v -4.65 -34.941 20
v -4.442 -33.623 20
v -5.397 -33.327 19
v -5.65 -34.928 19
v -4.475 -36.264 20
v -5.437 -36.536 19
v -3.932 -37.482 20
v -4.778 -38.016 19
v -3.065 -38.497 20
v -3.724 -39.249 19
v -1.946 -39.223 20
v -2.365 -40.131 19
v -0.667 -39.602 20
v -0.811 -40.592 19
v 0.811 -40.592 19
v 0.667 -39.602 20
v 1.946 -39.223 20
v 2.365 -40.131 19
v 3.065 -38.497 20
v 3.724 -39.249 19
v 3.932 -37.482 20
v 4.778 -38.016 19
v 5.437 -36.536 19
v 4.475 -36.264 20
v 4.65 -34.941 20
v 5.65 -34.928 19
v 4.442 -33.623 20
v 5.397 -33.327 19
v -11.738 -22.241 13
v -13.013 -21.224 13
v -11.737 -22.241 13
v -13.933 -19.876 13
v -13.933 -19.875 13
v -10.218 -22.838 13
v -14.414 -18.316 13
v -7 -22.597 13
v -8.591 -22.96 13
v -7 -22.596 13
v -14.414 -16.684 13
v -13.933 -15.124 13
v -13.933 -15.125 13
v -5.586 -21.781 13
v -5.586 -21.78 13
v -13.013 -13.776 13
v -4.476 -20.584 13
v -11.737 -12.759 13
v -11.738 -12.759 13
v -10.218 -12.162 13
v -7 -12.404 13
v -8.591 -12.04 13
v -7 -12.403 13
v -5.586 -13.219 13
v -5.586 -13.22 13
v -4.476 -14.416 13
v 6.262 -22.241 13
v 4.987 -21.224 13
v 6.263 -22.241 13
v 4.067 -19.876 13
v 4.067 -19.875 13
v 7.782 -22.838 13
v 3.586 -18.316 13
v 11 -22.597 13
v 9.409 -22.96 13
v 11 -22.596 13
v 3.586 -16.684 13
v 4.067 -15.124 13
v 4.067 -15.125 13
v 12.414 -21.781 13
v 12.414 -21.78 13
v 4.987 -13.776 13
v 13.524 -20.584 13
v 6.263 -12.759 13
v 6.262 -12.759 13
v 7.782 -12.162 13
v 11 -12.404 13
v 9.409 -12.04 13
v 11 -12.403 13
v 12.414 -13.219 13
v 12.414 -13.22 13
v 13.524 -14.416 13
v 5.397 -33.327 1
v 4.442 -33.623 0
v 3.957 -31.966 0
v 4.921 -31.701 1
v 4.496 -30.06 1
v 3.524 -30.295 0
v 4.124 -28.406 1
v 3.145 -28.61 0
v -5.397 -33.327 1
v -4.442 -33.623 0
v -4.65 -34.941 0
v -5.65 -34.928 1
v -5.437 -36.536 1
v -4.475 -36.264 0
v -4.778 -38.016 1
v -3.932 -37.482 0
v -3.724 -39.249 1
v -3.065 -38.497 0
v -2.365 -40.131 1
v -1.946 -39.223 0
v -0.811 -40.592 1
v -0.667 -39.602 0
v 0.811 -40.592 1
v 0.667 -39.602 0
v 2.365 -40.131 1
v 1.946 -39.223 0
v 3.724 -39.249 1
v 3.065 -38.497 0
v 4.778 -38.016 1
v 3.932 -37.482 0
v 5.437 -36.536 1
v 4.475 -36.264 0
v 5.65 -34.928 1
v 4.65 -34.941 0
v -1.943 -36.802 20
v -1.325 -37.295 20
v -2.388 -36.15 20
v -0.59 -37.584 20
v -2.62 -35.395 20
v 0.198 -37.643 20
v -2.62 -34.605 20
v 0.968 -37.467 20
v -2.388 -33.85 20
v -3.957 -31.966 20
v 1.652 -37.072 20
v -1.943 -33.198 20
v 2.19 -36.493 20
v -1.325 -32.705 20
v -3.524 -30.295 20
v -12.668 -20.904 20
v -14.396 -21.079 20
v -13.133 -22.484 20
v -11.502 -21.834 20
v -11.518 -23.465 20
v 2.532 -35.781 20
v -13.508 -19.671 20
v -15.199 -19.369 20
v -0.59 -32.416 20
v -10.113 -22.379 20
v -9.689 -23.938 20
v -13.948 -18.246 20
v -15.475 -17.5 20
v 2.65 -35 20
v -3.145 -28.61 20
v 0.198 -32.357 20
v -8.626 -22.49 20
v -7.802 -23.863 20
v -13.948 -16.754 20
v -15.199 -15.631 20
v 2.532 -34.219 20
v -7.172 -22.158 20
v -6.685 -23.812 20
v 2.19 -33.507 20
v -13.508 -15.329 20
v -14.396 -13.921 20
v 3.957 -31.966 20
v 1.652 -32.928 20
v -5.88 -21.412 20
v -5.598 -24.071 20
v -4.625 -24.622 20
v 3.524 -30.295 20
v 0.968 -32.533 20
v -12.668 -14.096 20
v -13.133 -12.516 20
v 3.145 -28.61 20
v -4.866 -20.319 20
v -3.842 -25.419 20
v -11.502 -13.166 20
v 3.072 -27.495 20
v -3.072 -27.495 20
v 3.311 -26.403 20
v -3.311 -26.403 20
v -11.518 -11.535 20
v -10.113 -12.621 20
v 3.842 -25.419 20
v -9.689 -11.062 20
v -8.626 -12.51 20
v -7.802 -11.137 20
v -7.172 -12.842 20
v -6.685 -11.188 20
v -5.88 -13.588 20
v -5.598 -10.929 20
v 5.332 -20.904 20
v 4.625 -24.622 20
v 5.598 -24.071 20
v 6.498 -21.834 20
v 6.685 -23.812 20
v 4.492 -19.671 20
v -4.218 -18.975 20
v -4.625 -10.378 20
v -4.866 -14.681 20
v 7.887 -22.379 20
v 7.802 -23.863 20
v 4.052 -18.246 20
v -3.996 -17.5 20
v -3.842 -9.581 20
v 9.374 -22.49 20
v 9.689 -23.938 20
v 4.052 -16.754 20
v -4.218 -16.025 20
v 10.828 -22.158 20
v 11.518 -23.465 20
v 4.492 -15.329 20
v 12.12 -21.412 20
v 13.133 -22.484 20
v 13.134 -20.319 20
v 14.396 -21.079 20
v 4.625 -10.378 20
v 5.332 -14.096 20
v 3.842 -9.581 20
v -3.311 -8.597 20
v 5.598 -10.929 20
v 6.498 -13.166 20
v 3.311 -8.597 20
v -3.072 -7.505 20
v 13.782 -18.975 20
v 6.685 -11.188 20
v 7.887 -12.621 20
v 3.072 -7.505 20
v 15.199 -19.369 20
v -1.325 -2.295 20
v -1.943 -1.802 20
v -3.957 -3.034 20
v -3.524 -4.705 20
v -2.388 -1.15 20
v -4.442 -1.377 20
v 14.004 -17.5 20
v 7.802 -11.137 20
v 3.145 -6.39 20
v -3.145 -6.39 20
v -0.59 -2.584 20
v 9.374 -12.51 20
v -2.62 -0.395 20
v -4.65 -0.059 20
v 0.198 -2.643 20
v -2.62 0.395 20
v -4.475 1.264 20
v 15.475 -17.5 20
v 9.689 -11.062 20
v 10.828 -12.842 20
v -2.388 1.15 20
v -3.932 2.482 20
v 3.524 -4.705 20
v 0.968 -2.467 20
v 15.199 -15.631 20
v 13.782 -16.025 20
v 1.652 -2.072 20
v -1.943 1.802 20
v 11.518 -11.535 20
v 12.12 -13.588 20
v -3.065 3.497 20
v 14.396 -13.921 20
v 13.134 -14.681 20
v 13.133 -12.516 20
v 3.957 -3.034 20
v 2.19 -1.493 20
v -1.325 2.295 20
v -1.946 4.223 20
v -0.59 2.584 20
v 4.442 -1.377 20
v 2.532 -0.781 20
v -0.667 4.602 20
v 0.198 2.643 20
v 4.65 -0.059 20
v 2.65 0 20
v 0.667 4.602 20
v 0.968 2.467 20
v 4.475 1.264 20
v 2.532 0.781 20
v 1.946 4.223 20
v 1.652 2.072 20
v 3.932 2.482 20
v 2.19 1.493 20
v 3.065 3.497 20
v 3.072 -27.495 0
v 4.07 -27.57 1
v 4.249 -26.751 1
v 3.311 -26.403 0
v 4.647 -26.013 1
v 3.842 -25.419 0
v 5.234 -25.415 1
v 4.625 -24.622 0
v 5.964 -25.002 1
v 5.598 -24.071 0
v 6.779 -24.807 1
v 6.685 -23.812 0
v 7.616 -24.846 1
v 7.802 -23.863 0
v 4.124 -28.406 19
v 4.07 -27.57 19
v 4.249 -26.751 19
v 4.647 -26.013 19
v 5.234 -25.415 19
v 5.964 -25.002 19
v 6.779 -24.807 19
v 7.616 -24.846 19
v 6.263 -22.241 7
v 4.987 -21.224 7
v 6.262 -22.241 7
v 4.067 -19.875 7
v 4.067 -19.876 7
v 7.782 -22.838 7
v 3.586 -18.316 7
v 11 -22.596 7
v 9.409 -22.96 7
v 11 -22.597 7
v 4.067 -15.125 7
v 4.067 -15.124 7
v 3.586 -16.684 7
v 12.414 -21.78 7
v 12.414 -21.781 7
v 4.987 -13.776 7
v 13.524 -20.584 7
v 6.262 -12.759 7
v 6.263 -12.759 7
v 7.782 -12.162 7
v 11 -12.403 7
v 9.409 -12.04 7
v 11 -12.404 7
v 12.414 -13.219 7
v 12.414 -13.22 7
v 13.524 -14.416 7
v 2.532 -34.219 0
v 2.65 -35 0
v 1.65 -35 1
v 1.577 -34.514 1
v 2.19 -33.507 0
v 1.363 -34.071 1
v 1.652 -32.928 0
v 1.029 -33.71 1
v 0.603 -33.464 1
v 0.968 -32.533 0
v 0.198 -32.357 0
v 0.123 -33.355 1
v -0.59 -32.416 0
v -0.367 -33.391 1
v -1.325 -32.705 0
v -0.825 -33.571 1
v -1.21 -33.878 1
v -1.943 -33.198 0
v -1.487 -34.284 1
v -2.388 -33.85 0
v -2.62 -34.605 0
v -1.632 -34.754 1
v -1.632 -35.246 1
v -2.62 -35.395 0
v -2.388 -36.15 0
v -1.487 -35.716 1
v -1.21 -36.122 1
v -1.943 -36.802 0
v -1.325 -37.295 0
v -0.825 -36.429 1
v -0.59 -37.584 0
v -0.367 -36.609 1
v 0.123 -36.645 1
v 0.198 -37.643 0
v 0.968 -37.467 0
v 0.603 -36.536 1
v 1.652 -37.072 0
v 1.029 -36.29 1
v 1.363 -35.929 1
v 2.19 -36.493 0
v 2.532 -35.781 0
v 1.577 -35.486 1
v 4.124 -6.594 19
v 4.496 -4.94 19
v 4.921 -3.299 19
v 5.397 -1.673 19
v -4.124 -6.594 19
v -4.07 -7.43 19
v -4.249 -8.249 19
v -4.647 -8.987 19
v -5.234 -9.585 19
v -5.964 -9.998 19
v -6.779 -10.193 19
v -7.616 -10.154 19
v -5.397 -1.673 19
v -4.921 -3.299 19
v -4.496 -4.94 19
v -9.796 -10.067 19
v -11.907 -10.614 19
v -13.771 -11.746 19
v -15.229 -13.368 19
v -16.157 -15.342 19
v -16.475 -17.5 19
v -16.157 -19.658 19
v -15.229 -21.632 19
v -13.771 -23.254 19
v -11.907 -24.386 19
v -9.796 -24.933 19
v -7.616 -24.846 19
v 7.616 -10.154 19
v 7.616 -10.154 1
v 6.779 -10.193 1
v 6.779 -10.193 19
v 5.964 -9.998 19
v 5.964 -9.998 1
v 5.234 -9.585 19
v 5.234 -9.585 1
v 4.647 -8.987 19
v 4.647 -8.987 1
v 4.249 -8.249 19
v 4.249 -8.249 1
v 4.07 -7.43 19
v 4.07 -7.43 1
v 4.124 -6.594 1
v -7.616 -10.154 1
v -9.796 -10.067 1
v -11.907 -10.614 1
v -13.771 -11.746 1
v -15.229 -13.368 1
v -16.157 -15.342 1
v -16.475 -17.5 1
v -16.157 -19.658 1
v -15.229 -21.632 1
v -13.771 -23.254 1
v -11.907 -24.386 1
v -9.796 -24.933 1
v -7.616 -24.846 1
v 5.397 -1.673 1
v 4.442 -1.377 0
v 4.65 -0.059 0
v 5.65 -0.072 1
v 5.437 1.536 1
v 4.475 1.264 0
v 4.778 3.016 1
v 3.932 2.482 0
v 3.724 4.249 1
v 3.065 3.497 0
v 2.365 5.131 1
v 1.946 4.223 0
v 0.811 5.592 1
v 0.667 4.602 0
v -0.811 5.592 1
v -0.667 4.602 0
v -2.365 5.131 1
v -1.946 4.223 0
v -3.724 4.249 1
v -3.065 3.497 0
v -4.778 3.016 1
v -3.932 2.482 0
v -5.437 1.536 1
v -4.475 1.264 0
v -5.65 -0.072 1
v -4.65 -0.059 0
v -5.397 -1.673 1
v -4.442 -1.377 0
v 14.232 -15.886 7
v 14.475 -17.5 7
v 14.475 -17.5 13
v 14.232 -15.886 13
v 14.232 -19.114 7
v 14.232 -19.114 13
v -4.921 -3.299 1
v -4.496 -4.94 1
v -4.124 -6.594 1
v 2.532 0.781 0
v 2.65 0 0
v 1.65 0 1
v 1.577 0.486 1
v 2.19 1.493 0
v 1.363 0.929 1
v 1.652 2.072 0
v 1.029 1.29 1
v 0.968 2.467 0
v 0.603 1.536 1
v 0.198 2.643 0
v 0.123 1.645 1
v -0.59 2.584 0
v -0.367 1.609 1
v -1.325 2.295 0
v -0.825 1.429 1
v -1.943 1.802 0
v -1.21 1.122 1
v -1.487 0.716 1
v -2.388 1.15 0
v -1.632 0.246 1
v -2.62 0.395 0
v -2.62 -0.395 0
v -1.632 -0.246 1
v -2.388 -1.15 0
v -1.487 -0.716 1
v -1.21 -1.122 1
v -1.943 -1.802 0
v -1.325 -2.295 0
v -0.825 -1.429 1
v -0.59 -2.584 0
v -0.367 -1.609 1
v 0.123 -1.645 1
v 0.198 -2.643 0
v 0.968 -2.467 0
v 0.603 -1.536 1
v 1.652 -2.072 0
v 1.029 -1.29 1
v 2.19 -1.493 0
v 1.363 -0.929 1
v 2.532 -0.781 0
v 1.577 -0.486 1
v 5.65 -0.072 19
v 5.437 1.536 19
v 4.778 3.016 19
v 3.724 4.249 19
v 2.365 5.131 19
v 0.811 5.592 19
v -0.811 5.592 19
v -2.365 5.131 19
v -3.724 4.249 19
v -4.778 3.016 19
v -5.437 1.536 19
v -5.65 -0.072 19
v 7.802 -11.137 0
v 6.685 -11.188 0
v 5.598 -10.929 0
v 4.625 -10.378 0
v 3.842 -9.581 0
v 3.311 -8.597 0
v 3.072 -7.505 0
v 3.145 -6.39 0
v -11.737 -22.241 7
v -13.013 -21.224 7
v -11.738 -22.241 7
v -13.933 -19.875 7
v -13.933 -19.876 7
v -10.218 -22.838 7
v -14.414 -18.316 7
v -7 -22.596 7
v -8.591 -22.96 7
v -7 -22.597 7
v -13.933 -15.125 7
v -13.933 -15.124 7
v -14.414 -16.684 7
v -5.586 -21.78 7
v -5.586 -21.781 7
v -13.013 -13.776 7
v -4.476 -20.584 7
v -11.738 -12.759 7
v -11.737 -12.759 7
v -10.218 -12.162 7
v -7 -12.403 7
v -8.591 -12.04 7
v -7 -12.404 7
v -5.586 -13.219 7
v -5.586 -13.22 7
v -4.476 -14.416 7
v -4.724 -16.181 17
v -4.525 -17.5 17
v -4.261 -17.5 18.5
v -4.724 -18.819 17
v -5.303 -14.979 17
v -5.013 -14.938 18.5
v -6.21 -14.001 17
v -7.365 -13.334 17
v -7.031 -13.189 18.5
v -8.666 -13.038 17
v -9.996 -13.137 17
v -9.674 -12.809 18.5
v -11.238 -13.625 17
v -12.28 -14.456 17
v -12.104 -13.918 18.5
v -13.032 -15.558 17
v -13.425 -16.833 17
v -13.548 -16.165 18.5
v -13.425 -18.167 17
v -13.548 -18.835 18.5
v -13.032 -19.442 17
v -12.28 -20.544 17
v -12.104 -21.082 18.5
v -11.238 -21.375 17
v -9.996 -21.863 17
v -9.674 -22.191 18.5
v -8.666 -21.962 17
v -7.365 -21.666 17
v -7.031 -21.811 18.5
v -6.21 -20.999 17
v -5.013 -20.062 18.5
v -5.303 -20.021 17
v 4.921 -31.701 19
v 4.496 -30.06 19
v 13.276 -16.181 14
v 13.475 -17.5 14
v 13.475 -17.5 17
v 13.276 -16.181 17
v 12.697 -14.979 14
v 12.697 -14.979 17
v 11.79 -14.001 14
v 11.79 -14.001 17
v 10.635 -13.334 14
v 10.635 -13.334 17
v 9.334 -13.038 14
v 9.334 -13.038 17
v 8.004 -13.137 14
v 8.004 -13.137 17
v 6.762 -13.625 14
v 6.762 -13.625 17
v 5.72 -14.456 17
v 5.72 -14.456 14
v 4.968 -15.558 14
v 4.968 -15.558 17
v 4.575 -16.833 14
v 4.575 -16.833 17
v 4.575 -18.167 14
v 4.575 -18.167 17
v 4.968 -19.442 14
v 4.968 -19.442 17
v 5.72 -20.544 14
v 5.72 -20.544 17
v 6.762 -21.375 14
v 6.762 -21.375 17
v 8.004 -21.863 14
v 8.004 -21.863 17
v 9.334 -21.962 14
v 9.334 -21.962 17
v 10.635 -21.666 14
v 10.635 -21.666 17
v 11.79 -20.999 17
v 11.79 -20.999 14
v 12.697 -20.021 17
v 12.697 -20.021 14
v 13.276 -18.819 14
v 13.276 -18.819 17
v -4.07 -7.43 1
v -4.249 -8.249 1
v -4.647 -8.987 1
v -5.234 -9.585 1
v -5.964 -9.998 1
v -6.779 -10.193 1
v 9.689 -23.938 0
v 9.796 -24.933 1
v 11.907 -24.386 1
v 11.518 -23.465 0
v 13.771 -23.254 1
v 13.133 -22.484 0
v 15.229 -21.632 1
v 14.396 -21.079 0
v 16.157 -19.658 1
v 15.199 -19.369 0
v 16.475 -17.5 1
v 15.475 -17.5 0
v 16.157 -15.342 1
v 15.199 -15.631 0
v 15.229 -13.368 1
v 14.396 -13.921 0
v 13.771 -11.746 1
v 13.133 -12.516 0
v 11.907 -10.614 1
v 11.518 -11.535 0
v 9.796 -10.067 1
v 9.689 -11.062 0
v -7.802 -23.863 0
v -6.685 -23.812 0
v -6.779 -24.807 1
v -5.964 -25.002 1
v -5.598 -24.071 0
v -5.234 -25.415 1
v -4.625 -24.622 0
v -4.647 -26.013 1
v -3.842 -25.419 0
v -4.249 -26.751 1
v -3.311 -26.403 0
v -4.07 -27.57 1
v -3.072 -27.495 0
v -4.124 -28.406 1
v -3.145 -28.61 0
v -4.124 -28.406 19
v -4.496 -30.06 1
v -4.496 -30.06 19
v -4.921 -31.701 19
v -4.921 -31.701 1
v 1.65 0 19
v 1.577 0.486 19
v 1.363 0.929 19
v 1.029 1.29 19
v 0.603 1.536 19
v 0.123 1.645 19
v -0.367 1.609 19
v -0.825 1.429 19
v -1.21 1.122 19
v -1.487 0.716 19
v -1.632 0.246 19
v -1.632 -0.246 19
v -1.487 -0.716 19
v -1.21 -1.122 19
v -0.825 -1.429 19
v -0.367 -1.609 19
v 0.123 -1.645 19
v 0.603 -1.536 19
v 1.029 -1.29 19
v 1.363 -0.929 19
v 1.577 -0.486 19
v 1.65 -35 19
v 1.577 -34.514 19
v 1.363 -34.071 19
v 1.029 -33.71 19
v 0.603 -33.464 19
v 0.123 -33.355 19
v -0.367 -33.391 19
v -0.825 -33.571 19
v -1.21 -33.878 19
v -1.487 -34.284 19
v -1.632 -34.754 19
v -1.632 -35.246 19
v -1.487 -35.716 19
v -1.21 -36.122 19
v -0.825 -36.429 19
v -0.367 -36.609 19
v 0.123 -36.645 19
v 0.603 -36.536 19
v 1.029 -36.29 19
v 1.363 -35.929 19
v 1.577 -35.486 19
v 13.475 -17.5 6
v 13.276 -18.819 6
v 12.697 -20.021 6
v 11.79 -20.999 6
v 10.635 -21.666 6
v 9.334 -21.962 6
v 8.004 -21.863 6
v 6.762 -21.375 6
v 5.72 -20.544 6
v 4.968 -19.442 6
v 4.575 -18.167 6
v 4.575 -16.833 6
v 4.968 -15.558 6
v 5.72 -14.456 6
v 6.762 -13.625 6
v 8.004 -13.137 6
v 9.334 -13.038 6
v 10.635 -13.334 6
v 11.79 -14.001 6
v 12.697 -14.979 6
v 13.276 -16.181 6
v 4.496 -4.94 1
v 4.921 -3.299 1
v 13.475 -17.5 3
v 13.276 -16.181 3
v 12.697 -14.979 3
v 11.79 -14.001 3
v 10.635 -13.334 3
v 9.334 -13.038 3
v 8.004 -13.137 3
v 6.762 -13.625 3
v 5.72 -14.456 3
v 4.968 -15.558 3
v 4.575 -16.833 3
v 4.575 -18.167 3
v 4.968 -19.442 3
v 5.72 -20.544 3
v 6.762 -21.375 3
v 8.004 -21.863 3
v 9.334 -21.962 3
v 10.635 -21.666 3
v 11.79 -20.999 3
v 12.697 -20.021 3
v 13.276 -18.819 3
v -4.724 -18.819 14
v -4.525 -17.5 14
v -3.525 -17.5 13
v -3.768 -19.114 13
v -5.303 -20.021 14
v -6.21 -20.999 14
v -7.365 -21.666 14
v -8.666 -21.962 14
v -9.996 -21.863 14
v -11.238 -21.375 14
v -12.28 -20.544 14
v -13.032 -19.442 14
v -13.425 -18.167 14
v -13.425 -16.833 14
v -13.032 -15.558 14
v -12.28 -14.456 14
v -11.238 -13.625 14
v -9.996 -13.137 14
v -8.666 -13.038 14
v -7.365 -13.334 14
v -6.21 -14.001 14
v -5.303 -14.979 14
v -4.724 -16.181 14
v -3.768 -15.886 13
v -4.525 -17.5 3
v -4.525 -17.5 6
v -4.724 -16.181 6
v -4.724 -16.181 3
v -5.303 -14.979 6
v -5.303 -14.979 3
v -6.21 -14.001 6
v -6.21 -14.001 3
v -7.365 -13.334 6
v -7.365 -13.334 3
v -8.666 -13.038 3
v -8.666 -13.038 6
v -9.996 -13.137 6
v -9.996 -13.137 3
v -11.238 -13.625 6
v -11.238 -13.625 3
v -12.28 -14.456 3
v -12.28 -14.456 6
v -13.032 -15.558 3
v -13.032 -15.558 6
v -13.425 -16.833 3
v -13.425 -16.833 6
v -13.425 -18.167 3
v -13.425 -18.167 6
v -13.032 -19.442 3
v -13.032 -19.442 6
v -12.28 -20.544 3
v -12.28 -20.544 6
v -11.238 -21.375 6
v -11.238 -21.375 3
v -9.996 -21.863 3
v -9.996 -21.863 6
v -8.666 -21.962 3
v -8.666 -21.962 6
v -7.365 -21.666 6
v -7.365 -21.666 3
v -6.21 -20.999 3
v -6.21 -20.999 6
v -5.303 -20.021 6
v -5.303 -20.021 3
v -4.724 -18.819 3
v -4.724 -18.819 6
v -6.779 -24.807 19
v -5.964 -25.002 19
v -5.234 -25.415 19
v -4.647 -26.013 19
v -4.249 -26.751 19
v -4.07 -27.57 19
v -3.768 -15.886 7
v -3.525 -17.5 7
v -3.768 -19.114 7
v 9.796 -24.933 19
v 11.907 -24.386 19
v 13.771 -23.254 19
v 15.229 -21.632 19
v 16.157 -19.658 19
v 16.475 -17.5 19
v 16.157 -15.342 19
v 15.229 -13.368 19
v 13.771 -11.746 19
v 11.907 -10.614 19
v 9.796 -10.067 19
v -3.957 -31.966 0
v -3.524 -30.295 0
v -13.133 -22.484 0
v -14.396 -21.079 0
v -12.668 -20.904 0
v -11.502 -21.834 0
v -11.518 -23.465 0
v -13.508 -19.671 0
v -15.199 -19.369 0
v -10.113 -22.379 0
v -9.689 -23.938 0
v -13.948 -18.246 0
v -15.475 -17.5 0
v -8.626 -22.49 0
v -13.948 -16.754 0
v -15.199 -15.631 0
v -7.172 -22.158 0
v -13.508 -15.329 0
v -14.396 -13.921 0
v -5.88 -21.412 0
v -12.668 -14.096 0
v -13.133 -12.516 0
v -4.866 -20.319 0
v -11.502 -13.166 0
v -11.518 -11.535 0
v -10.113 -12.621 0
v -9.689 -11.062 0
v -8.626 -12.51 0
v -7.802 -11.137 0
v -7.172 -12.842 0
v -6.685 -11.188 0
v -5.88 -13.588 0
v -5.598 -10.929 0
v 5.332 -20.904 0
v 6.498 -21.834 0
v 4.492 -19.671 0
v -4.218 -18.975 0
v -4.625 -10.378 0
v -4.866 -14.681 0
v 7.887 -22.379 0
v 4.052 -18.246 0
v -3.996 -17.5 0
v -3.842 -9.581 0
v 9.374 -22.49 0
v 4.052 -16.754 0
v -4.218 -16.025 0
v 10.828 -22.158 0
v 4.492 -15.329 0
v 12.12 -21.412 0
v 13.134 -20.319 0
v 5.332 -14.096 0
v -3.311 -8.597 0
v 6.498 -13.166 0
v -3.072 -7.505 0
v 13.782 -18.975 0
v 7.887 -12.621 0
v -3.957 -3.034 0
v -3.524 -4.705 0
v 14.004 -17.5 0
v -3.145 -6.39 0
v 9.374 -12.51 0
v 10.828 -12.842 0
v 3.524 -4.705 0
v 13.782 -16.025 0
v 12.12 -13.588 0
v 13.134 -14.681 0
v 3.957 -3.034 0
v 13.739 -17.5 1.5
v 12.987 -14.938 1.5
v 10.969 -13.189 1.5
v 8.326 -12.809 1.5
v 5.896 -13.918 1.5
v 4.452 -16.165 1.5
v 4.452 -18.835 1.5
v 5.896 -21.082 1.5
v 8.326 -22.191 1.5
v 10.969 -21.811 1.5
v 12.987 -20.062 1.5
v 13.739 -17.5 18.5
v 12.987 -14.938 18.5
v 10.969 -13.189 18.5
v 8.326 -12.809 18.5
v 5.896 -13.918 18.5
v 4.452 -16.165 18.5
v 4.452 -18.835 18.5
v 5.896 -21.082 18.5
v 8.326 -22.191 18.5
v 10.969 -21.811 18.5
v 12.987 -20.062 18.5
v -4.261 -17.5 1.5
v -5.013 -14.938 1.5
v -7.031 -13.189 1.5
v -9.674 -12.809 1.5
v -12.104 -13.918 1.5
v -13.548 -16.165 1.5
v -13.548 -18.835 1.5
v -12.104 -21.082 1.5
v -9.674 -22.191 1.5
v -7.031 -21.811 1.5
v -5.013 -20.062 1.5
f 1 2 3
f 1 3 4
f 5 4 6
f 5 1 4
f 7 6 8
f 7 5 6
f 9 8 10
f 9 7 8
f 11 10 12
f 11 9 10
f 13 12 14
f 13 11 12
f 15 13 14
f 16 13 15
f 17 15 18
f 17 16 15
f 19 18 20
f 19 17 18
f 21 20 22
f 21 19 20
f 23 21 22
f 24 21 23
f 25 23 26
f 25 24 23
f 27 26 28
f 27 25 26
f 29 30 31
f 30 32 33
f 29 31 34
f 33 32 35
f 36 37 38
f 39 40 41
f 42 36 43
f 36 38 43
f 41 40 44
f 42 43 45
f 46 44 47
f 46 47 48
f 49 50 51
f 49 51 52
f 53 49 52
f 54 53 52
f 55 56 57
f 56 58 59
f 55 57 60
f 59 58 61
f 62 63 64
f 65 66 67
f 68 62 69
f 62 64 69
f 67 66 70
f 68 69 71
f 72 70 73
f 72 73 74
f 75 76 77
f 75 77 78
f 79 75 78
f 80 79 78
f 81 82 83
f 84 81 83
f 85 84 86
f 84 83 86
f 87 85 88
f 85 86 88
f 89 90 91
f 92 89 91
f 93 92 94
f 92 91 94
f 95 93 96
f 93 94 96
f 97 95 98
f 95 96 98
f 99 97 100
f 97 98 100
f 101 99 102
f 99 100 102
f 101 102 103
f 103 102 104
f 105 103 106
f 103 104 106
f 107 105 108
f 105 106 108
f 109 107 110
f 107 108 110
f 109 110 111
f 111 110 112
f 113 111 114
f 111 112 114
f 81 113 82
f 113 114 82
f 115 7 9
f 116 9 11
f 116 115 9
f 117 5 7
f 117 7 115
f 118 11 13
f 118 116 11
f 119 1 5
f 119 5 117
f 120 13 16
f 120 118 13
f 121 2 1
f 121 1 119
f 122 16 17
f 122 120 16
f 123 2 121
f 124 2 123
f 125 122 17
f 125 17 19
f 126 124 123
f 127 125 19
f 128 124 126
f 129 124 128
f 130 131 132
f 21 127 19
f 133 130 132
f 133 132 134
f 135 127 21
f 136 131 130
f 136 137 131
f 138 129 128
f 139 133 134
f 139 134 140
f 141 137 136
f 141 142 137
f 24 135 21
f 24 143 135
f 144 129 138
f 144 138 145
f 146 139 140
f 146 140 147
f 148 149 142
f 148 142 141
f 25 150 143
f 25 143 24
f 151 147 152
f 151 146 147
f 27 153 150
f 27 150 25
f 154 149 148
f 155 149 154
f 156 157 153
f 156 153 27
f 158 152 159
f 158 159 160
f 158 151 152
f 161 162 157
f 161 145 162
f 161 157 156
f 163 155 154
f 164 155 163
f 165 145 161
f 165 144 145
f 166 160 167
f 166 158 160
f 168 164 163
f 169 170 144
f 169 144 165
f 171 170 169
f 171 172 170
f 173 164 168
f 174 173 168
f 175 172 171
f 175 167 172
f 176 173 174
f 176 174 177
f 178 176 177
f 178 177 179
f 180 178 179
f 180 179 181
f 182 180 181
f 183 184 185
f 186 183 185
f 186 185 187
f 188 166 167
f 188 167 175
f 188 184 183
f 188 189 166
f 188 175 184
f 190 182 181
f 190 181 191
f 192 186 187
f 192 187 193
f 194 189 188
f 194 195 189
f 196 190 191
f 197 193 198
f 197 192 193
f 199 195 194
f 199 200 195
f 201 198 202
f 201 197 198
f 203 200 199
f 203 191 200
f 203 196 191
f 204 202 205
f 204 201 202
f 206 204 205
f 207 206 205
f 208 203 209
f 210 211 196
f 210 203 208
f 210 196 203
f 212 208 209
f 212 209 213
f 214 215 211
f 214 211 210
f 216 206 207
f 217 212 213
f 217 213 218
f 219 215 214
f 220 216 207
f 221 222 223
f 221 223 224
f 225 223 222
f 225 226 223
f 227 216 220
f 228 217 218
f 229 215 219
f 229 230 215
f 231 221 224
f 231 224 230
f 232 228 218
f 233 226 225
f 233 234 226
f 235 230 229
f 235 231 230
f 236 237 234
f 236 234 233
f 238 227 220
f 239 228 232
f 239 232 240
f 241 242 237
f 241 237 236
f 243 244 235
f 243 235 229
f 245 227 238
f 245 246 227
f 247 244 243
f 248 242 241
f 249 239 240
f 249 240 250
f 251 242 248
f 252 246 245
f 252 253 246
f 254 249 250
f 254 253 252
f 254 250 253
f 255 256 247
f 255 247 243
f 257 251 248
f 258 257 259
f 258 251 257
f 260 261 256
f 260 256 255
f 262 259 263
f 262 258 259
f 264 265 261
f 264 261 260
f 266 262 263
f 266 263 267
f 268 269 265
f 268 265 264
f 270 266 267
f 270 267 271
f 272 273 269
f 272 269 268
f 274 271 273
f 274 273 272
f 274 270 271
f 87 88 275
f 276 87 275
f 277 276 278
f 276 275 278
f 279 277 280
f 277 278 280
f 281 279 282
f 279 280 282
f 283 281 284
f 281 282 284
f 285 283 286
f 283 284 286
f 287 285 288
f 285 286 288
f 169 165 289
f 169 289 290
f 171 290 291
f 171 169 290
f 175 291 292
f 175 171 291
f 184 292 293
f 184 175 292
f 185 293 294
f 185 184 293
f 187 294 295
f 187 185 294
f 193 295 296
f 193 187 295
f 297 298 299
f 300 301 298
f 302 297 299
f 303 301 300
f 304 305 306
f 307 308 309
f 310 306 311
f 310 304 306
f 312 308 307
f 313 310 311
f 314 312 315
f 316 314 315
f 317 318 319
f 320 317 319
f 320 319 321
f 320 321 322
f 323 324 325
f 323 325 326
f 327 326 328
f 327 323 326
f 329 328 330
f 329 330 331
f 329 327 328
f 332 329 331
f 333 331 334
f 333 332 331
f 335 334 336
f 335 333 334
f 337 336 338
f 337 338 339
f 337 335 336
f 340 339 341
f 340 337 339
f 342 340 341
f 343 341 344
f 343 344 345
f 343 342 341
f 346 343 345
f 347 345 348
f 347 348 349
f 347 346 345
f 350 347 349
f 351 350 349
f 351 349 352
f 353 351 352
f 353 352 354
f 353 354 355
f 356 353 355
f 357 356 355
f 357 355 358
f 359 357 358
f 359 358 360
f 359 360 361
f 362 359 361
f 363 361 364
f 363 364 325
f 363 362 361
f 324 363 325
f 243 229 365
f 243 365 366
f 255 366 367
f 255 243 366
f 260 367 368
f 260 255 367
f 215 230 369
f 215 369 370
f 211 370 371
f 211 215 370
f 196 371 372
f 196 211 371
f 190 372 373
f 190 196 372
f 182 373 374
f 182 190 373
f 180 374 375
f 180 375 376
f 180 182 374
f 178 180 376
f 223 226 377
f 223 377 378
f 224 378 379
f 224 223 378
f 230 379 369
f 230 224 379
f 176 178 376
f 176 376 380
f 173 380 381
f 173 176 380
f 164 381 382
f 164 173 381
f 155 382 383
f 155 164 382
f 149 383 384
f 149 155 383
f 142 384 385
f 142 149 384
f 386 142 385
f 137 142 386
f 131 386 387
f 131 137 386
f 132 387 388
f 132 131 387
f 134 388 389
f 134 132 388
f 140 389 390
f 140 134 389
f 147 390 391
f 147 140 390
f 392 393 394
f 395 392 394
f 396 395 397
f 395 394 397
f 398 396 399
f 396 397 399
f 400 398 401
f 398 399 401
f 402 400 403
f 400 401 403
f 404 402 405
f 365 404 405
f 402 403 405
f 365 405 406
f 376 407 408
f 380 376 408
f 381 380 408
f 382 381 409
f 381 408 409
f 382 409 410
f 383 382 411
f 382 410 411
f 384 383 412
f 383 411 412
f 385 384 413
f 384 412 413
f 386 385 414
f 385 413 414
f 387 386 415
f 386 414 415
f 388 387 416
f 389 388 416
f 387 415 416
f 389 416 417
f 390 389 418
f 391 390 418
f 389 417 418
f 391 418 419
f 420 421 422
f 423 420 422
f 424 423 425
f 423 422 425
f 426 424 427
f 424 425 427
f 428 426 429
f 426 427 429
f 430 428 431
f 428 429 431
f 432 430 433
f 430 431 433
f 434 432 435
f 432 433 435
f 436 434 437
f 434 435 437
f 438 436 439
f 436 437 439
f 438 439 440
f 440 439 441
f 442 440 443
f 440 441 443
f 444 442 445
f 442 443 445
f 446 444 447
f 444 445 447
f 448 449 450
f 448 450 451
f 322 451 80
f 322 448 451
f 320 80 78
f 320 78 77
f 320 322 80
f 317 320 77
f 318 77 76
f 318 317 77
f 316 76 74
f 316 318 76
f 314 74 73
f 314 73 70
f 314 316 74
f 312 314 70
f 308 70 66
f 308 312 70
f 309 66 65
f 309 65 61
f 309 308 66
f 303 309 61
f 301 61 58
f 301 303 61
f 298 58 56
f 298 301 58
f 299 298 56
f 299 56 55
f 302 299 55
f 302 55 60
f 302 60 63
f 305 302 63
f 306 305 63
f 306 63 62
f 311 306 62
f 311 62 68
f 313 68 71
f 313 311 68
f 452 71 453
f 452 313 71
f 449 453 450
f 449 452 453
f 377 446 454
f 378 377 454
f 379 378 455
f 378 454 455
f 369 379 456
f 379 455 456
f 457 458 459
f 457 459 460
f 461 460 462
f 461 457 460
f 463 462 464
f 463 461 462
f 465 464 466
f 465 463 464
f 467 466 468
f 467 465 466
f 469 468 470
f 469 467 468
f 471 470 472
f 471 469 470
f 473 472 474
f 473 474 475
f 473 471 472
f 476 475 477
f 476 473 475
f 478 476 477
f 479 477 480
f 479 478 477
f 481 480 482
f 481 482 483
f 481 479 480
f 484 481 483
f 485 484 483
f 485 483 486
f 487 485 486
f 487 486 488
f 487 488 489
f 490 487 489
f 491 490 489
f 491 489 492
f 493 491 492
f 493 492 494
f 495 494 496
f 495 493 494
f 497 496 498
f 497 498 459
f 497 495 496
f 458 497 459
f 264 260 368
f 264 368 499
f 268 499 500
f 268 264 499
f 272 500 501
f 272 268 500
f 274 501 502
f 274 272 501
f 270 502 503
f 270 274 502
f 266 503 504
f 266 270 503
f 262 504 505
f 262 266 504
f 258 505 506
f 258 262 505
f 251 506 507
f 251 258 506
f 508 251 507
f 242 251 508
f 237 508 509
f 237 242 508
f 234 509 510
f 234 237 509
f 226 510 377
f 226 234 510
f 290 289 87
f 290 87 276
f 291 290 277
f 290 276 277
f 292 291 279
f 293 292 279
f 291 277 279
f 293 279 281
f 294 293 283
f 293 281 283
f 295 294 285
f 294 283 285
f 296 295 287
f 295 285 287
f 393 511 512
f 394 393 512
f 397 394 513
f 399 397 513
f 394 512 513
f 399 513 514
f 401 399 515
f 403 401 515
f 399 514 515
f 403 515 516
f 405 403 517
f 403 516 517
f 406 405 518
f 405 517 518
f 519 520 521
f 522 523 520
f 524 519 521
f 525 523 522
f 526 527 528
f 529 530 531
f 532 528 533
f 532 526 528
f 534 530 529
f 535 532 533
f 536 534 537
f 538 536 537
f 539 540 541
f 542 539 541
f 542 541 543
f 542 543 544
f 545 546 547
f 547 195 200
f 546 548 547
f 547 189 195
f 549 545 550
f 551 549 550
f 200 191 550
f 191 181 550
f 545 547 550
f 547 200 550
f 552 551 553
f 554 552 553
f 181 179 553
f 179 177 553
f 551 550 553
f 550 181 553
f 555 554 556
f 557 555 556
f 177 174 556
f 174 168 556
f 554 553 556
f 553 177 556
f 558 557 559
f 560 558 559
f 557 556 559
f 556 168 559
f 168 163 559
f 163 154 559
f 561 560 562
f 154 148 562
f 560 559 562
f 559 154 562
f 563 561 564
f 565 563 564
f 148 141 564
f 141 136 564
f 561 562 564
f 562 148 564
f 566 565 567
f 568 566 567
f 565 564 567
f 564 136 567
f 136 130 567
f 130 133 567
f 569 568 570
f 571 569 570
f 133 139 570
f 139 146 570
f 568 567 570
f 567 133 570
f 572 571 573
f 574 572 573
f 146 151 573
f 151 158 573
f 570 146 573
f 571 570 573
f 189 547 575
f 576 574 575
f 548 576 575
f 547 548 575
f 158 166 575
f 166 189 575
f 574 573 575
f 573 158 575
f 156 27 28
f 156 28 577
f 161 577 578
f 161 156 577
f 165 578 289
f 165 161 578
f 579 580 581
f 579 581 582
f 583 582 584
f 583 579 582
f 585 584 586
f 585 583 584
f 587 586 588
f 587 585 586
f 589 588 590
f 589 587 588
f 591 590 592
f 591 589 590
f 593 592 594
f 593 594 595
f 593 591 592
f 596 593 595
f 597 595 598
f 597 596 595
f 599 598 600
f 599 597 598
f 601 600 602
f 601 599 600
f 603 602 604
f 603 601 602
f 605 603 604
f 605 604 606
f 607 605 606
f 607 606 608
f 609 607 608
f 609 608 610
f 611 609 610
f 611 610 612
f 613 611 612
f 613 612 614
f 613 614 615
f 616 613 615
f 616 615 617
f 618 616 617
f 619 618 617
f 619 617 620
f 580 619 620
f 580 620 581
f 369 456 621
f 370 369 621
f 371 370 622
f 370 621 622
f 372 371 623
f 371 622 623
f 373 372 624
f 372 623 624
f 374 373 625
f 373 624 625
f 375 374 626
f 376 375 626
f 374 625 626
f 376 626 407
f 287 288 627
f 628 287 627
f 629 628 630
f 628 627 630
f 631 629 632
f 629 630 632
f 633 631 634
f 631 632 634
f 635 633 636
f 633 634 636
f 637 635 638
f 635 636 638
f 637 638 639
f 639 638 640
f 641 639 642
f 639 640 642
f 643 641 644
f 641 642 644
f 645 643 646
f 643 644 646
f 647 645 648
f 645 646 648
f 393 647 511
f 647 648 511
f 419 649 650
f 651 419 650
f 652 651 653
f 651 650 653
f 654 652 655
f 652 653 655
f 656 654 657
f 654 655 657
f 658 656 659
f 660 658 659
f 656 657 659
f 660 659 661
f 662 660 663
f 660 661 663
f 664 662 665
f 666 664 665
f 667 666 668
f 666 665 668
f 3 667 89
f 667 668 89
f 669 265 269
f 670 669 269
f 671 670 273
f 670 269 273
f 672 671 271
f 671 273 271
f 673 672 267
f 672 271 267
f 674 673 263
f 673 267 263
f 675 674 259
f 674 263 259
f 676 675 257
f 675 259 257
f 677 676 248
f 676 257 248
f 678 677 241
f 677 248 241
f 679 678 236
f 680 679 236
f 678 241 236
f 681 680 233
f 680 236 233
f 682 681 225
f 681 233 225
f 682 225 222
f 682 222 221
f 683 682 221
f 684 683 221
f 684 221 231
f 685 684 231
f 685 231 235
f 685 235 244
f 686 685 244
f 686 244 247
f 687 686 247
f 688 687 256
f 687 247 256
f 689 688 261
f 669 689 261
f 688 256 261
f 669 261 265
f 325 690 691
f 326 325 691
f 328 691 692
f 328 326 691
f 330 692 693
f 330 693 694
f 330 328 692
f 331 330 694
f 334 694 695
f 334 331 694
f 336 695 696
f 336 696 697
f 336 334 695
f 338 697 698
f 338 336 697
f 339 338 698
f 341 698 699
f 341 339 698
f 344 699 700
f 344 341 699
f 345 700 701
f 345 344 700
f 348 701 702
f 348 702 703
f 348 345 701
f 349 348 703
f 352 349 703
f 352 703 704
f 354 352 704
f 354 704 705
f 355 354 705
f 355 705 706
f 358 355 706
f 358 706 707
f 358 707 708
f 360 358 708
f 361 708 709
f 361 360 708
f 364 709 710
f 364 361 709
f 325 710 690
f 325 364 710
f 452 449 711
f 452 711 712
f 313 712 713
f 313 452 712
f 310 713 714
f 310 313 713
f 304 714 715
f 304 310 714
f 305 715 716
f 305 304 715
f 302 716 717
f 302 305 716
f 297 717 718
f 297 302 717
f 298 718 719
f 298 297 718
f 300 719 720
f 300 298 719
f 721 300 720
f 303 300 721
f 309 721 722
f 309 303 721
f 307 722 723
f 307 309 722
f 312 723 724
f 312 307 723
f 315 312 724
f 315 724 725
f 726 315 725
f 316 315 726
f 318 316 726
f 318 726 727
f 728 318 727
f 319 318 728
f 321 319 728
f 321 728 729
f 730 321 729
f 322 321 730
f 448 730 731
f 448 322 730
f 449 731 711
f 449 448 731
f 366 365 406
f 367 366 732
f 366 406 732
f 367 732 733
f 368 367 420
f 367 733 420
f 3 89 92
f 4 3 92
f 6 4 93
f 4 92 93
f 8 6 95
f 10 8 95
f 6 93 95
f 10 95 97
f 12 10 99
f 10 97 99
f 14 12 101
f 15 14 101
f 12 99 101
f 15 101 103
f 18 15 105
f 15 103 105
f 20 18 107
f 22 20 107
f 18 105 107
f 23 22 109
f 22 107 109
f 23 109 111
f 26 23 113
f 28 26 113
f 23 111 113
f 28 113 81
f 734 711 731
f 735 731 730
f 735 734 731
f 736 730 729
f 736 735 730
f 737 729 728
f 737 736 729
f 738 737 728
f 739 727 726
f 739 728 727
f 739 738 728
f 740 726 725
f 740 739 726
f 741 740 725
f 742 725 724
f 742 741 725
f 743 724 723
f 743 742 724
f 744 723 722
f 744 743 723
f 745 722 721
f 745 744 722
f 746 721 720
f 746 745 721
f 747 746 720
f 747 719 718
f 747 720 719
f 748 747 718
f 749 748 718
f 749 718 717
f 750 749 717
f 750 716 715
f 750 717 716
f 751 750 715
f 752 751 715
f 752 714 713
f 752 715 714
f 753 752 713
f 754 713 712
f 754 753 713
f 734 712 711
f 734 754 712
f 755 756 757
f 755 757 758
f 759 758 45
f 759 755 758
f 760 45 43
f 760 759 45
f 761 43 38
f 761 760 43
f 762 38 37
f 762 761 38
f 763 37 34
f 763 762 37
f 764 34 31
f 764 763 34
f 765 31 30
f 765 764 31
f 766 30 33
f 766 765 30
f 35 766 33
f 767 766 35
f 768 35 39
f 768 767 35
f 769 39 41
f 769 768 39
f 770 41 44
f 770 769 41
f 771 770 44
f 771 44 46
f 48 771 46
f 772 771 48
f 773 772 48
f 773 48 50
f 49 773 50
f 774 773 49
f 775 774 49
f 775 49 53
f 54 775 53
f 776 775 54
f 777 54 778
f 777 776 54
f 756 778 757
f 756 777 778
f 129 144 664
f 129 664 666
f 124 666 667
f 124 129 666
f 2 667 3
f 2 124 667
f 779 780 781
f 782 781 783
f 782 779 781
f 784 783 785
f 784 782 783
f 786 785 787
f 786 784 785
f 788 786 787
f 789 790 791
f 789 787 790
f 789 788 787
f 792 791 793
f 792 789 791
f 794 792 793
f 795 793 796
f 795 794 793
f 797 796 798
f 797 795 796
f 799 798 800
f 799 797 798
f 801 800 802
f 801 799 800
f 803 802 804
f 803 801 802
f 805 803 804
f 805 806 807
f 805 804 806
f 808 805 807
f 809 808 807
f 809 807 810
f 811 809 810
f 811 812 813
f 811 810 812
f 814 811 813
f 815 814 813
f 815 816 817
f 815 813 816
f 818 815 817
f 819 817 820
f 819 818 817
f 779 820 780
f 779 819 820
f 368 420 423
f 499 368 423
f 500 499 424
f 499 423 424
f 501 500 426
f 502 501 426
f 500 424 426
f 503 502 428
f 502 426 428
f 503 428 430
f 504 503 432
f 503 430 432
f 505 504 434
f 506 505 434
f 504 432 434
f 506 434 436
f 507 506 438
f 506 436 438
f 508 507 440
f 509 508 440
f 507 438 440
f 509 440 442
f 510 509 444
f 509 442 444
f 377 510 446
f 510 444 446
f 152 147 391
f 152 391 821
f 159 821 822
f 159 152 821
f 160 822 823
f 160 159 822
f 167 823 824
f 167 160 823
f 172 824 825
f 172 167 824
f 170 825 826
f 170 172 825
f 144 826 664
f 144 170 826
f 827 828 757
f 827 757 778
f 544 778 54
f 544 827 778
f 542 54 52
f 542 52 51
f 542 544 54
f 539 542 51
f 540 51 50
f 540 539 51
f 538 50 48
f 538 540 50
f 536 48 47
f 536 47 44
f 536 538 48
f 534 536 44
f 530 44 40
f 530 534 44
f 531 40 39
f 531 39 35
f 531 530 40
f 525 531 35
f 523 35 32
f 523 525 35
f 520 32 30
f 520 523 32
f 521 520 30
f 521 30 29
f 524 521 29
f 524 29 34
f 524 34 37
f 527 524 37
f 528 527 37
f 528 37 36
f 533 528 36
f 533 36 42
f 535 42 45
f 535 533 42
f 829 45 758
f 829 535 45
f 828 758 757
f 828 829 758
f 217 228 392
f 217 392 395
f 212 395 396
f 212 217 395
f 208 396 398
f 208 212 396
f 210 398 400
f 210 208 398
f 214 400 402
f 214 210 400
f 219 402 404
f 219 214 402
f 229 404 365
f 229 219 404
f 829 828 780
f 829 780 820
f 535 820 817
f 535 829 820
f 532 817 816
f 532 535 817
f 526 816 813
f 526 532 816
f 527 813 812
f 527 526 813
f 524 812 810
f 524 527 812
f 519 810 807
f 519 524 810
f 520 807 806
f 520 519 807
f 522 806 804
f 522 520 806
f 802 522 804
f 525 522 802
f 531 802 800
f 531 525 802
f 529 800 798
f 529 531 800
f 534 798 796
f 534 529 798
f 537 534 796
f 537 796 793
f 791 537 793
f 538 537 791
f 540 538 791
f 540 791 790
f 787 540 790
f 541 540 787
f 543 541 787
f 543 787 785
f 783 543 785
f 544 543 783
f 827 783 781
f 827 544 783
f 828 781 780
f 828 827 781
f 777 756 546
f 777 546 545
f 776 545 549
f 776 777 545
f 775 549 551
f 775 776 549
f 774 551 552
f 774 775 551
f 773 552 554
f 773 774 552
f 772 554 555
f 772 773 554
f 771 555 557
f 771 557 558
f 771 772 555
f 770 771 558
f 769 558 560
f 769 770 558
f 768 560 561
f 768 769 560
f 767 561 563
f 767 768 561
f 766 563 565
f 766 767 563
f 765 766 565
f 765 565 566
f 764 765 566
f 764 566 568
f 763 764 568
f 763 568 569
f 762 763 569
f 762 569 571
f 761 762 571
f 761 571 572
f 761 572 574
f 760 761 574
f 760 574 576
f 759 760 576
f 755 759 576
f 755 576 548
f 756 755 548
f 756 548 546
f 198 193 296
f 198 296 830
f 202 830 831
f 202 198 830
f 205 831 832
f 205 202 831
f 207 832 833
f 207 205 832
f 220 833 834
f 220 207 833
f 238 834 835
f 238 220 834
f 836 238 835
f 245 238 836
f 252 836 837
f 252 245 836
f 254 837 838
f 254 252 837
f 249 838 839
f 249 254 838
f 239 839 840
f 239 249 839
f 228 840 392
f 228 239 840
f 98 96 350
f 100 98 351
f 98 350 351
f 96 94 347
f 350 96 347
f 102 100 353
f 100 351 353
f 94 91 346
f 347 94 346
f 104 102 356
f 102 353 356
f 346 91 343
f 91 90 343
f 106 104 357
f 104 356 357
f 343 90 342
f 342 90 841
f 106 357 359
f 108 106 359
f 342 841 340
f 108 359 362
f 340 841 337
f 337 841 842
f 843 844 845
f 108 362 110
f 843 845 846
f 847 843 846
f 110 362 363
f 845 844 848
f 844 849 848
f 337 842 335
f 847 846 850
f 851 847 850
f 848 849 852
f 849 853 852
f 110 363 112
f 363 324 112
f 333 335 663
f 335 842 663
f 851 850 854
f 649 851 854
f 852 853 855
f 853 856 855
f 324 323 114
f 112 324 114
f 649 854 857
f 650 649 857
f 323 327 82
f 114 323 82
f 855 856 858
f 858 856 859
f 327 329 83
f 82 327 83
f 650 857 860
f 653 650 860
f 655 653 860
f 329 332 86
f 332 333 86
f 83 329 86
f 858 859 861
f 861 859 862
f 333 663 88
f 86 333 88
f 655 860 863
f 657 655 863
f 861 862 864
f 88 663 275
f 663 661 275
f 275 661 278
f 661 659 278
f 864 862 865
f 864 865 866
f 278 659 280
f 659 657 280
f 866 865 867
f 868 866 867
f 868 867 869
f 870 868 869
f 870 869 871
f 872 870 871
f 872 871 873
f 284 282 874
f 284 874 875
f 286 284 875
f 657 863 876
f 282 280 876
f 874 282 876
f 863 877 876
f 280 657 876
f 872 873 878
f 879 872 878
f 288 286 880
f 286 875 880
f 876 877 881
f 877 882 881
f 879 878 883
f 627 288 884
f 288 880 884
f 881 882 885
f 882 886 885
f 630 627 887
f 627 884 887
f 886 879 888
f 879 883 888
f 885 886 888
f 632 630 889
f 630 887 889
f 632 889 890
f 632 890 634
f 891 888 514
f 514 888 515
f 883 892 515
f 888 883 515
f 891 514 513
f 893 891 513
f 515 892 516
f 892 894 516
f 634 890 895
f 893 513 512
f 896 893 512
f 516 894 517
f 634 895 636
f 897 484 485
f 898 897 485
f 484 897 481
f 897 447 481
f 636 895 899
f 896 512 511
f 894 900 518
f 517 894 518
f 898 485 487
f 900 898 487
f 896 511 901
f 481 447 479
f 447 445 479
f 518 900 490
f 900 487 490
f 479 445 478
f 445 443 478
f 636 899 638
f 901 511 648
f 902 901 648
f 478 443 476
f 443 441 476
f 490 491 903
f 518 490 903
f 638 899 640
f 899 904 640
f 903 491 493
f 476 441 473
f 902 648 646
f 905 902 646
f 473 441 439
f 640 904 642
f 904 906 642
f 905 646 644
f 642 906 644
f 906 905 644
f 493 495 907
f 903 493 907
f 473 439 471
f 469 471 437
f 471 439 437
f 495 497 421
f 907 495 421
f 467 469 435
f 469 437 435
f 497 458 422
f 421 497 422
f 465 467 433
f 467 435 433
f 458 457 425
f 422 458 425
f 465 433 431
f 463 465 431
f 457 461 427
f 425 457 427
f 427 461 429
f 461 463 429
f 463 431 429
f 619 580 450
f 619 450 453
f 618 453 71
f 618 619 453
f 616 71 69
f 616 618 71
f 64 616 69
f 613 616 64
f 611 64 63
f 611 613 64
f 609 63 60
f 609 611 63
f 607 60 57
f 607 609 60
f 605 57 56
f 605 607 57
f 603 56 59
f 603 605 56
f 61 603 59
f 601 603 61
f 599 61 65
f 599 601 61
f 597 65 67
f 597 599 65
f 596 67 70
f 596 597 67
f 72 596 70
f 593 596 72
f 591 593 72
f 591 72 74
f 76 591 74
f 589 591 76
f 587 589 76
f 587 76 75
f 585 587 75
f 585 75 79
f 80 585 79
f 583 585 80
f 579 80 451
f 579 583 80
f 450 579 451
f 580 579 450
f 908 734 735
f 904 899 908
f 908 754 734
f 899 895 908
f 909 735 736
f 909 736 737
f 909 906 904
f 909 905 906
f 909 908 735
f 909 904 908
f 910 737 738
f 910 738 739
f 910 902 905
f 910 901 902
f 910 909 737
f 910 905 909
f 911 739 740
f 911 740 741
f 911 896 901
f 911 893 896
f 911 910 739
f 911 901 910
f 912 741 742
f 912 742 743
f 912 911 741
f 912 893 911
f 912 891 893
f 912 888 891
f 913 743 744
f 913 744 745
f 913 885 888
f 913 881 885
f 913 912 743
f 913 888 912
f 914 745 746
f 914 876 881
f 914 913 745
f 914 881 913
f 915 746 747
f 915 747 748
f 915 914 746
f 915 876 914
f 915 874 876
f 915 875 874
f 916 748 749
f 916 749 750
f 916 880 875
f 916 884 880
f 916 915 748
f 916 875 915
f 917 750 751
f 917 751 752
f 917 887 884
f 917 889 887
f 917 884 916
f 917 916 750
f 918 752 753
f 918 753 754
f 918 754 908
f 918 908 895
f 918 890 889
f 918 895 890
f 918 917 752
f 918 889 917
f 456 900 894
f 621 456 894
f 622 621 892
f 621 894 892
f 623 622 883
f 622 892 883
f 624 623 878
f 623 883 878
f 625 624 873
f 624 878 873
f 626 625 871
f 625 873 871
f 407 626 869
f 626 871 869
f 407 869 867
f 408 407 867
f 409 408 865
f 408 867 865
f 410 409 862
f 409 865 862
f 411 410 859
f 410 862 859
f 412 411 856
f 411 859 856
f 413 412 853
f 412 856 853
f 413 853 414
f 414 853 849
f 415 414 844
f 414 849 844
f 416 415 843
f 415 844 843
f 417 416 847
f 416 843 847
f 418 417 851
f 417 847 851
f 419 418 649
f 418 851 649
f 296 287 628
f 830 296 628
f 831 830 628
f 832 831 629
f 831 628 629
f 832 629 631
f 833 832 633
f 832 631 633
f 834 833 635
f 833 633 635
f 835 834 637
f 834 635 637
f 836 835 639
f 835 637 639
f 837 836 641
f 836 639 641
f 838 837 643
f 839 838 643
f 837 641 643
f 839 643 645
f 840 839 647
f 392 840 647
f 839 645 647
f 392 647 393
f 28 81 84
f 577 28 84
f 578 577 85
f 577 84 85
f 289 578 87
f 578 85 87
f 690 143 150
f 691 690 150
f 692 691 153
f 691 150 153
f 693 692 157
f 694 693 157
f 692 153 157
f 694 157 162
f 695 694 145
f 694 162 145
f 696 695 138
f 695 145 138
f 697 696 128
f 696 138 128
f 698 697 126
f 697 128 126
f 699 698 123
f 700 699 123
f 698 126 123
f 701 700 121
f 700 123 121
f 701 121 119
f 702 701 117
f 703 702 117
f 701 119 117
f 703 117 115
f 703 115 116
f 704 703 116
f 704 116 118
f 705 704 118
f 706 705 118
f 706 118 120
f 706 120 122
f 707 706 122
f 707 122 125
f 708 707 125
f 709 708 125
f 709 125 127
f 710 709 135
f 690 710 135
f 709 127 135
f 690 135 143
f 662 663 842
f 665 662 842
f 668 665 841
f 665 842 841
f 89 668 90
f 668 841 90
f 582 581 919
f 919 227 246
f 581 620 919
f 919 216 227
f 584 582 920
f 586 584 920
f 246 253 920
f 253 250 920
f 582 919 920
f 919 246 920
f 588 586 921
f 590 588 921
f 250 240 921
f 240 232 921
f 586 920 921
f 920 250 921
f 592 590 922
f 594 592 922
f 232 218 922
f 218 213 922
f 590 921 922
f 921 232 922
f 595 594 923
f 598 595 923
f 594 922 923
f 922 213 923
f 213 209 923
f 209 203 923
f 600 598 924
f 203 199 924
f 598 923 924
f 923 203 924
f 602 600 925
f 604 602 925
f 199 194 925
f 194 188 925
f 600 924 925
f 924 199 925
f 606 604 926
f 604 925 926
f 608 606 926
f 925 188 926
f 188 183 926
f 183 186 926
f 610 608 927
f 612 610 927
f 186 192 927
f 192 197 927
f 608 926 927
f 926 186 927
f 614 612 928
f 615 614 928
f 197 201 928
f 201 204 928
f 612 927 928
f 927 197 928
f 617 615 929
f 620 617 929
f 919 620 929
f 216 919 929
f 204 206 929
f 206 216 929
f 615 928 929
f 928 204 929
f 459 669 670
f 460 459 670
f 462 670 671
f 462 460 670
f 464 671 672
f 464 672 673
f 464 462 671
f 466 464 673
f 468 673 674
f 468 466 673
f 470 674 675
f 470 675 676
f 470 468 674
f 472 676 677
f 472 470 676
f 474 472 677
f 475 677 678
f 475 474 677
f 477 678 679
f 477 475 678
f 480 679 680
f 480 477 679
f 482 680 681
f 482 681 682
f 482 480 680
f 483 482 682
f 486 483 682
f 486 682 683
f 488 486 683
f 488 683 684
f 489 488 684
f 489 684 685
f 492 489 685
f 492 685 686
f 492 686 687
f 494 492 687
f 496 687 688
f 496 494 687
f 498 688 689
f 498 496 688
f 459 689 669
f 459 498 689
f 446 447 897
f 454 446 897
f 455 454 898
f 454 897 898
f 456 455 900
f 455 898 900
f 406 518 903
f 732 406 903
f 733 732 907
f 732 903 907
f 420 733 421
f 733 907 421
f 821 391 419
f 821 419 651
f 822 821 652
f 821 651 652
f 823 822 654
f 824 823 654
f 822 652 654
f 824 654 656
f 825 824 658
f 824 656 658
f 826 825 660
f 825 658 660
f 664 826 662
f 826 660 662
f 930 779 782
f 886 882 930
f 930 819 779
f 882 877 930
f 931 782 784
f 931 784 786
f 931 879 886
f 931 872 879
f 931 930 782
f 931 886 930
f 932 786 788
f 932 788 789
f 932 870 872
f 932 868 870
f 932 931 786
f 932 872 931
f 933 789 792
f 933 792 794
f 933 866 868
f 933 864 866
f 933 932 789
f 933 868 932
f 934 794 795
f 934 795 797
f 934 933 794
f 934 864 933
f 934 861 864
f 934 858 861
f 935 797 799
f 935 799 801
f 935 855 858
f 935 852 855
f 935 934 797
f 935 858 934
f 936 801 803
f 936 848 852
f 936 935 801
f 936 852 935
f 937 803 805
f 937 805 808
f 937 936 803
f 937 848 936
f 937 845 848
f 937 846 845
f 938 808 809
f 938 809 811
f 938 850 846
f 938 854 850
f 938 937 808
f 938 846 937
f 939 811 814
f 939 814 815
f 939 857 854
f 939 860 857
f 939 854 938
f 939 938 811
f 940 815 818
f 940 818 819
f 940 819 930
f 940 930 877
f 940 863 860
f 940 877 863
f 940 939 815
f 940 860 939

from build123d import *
from OCP.BRepFilletAPI import BRepFilletAPI_MakeChamfer

# Parameters (mm, degrees)
SKETCH1_R               = 1.65
SKETCH1_R_2             = 4.475
BOSS_EXTRUDE1_DEPTH     = 20
CHAMFER1_SIZE           = 1
CHAMFER2_SIZE           = 3
CHAMFER2_SIZE2          = 0.528980942
CUT_EXTRUDE1_DEPTH      = 3
CUT_EXTRUDE1_DEPTH_BACK = 3
SKETCH5_R               = 5.475
CHAMFER3_SIZE           = 1


with BuildPart() as part:
    # Sketch1 → Boss-Extrude1 (new body)
    with BuildSketch(Plane.XY):
        with BuildLine():
            ThreePointArc((5.396692576, -1.672784876), (0, 5.65), (-5.396692576, -1.672784876))
            ThreePointArc((-5.396692576, -1.672784876), (-4.701973782, -4.118237099), (-4.124302136, -6.593952399))
            ThreePointArc((-4.124302136, -6.593952399), (-4.919523181, -9.306745557), (-7.616470373, -10.154152821))
            ThreePointArc((-7.616470373, -10.154152821), (-16.475, -17.5), (-7.616470373, -24.845847179))
            ThreePointArc((-7.616470373, -24.845847179), (-4.919523181, -25.693254443), (-4.124302136, -28.406047601))
            ThreePointArc((-4.124302136, -28.406047601), (-4.701973782, -30.881762901), (-5.396692576, -33.327215124))
            ThreePointArc((-5.396692576, -33.327215124), (0, -40.65), (5.396692576, -33.327215124))
            ThreePointArc((5.396692576, -33.327215124), (4.701973782, -30.881762901), (4.124302136, -28.406047601))
            ThreePointArc((4.124302136, -28.406047601), (4.919523181, -25.693254443), (7.616470373, -24.845847179))
            ThreePointArc((7.616470373, -24.845847179), (16.475, -17.5), (7.616470373, -10.154152821))
            ThreePointArc((7.616470373, -10.154152821), (4.919523181, -9.306745557), (4.124302136, -6.593952399))
            ThreePointArc((4.124302136, -6.593952399), (4.701973782, -4.118237099), (5.396692576, -1.672784876))
        make_face()
        Circle(SKETCH1_R, mode=Mode.SUBTRACT)
        with Locations((0, -35)):
            Circle(SKETCH1_R, mode=Mode.SUBTRACT)
        with Locations((9, -17.5)):
            Circle(SKETCH1_R_2, mode=Mode.SUBTRACT)
        with Locations((-9, -17.5)):
            Circle(SKETCH1_R_2, mode=Mode.SUBTRACT)
    extrude(amount=BOSS_EXTRUDE1_DEPTH)

    # Chamfer1
    chamfer1_edges = [part.edges().sort_by_distance(p)[0] for p in [
        (0, -40.65, 0),
        (-4.701973782, -30.881762901, 0),
        (16.475, -17.5, 20),
        (-4.919523181, -25.693254443, 0),
        (-16.475, -17.5, 0),
        (-4.919523181, -9.306745557, 0),
        (-4.701973782, -4.118237099, 0),
        (0, 5.65, 0),
        (4.701973782, -4.118237099, 0),
        (4.919523181, -9.306745557, 0),
        (16.475, -17.5, 0),
        (4.919523181, -25.693254443, 0),
        (4.701973782, -30.881762901, 0),
        (4.919523181, -9.306745557, 20),
        (4.701973782, -4.118237099, 20),
        (0, 5.65, 20),
        (-4.701973782, -4.118237099, 20),
        (-1.65, 0, 0),
        (-1.65, 0, 20),
        (-4.919523181, -9.306745557, 20),
        (-1.65, -35, 0),
        (-1.65, -35, 20),
        (-16.475, -17.5, 20),
        (-4.919523181, -25.693254443, 20),
        (-4.701973782, -30.881762901, 20),
        (0, -40.65, 20),
        (4.701973782, -30.881762901, 20),
        (4.919523181, -25.693254443, 20),
    ]]
    chamfer(chamfer1_edges, length=CHAMFER1_SIZE)

    # Chamfer2: one chamfer whose edges measure the first distance from different faces: ONE call of the kernel's chamfer builder (chamfer() names one face for all edges)
    chamfer2_edges_1 = [part.edges().sort_by_distance(p)[0] for p in [
        (4.525, -17.5, 0),
        (4.525, -17.5, 20),
    ]]
    chamfer2_side_1 = [part.faces().sort_by_distance(p)[0] for p in [
        (4.525, -17.5, 10),
    ]]
    chamfer2_edges_2 = [part.edges().sort_by_distance(p)[0] for p in [
        (-13.475, -17.5, 0),
        (-13.475, -17.5, 20),
    ]]
    chamfer2_side_2 = [part.faces().sort_by_distance(p)[0] for p in [
        (-13.475, -17.5, 10),
    ]]
    chamfer2 = BRepFilletAPI_MakeChamfer(part.part.solid().wrapped)
    for e in chamfer2_edges_1:
        chamfer2.Add(CHAMFER2_SIZE, CHAMFER2_SIZE2, e.wrapped, chamfer2_side_1[0].wrapped)  # the first distance lies on this face
    for e in chamfer2_edges_2:
        chamfer2.Add(CHAMFER2_SIZE, CHAMFER2_SIZE2, e.wrapped, chamfer2_side_2[0].wrapped)  # the first distance lies on this face
    add(Compound.cast(chamfer2.Shape()), mode=Mode.REPLACE)

    # Sketch5 → Cut-Extrude1 (cut, two sides: drawn at the far end of the back side and taken through both)
    with BuildSketch(Plane.XY.offset(10).offset(-CUT_EXTRUDE1_DEPTH_BACK)):
        with Locations((-9, -17.5)):
            Circle(SKETCH5_R)
        with Locations((9, -17.5)):
            Circle(SKETCH5_R)
    extrude(amount=CUT_EXTRUDE1_DEPTH + CUT_EXTRUDE1_DEPTH_BACK, mode=Mode.SUBTRACT)

    # Chamfer3
    chamfer3_edges = [part.edges().sort_by_distance(p)[0] for p in [
        (-13.475, -17.5, 13),
        (-13.475, -17.5, 7),
        (4.525, -17.5, 13),
        (4.525, -17.5, 7),
    ]]
    chamfer(chamfer3_edges, length=CHAMFER3_SIZE - 0.0001)  # a hair under: the kernel refuses the full size


solid = part.part
